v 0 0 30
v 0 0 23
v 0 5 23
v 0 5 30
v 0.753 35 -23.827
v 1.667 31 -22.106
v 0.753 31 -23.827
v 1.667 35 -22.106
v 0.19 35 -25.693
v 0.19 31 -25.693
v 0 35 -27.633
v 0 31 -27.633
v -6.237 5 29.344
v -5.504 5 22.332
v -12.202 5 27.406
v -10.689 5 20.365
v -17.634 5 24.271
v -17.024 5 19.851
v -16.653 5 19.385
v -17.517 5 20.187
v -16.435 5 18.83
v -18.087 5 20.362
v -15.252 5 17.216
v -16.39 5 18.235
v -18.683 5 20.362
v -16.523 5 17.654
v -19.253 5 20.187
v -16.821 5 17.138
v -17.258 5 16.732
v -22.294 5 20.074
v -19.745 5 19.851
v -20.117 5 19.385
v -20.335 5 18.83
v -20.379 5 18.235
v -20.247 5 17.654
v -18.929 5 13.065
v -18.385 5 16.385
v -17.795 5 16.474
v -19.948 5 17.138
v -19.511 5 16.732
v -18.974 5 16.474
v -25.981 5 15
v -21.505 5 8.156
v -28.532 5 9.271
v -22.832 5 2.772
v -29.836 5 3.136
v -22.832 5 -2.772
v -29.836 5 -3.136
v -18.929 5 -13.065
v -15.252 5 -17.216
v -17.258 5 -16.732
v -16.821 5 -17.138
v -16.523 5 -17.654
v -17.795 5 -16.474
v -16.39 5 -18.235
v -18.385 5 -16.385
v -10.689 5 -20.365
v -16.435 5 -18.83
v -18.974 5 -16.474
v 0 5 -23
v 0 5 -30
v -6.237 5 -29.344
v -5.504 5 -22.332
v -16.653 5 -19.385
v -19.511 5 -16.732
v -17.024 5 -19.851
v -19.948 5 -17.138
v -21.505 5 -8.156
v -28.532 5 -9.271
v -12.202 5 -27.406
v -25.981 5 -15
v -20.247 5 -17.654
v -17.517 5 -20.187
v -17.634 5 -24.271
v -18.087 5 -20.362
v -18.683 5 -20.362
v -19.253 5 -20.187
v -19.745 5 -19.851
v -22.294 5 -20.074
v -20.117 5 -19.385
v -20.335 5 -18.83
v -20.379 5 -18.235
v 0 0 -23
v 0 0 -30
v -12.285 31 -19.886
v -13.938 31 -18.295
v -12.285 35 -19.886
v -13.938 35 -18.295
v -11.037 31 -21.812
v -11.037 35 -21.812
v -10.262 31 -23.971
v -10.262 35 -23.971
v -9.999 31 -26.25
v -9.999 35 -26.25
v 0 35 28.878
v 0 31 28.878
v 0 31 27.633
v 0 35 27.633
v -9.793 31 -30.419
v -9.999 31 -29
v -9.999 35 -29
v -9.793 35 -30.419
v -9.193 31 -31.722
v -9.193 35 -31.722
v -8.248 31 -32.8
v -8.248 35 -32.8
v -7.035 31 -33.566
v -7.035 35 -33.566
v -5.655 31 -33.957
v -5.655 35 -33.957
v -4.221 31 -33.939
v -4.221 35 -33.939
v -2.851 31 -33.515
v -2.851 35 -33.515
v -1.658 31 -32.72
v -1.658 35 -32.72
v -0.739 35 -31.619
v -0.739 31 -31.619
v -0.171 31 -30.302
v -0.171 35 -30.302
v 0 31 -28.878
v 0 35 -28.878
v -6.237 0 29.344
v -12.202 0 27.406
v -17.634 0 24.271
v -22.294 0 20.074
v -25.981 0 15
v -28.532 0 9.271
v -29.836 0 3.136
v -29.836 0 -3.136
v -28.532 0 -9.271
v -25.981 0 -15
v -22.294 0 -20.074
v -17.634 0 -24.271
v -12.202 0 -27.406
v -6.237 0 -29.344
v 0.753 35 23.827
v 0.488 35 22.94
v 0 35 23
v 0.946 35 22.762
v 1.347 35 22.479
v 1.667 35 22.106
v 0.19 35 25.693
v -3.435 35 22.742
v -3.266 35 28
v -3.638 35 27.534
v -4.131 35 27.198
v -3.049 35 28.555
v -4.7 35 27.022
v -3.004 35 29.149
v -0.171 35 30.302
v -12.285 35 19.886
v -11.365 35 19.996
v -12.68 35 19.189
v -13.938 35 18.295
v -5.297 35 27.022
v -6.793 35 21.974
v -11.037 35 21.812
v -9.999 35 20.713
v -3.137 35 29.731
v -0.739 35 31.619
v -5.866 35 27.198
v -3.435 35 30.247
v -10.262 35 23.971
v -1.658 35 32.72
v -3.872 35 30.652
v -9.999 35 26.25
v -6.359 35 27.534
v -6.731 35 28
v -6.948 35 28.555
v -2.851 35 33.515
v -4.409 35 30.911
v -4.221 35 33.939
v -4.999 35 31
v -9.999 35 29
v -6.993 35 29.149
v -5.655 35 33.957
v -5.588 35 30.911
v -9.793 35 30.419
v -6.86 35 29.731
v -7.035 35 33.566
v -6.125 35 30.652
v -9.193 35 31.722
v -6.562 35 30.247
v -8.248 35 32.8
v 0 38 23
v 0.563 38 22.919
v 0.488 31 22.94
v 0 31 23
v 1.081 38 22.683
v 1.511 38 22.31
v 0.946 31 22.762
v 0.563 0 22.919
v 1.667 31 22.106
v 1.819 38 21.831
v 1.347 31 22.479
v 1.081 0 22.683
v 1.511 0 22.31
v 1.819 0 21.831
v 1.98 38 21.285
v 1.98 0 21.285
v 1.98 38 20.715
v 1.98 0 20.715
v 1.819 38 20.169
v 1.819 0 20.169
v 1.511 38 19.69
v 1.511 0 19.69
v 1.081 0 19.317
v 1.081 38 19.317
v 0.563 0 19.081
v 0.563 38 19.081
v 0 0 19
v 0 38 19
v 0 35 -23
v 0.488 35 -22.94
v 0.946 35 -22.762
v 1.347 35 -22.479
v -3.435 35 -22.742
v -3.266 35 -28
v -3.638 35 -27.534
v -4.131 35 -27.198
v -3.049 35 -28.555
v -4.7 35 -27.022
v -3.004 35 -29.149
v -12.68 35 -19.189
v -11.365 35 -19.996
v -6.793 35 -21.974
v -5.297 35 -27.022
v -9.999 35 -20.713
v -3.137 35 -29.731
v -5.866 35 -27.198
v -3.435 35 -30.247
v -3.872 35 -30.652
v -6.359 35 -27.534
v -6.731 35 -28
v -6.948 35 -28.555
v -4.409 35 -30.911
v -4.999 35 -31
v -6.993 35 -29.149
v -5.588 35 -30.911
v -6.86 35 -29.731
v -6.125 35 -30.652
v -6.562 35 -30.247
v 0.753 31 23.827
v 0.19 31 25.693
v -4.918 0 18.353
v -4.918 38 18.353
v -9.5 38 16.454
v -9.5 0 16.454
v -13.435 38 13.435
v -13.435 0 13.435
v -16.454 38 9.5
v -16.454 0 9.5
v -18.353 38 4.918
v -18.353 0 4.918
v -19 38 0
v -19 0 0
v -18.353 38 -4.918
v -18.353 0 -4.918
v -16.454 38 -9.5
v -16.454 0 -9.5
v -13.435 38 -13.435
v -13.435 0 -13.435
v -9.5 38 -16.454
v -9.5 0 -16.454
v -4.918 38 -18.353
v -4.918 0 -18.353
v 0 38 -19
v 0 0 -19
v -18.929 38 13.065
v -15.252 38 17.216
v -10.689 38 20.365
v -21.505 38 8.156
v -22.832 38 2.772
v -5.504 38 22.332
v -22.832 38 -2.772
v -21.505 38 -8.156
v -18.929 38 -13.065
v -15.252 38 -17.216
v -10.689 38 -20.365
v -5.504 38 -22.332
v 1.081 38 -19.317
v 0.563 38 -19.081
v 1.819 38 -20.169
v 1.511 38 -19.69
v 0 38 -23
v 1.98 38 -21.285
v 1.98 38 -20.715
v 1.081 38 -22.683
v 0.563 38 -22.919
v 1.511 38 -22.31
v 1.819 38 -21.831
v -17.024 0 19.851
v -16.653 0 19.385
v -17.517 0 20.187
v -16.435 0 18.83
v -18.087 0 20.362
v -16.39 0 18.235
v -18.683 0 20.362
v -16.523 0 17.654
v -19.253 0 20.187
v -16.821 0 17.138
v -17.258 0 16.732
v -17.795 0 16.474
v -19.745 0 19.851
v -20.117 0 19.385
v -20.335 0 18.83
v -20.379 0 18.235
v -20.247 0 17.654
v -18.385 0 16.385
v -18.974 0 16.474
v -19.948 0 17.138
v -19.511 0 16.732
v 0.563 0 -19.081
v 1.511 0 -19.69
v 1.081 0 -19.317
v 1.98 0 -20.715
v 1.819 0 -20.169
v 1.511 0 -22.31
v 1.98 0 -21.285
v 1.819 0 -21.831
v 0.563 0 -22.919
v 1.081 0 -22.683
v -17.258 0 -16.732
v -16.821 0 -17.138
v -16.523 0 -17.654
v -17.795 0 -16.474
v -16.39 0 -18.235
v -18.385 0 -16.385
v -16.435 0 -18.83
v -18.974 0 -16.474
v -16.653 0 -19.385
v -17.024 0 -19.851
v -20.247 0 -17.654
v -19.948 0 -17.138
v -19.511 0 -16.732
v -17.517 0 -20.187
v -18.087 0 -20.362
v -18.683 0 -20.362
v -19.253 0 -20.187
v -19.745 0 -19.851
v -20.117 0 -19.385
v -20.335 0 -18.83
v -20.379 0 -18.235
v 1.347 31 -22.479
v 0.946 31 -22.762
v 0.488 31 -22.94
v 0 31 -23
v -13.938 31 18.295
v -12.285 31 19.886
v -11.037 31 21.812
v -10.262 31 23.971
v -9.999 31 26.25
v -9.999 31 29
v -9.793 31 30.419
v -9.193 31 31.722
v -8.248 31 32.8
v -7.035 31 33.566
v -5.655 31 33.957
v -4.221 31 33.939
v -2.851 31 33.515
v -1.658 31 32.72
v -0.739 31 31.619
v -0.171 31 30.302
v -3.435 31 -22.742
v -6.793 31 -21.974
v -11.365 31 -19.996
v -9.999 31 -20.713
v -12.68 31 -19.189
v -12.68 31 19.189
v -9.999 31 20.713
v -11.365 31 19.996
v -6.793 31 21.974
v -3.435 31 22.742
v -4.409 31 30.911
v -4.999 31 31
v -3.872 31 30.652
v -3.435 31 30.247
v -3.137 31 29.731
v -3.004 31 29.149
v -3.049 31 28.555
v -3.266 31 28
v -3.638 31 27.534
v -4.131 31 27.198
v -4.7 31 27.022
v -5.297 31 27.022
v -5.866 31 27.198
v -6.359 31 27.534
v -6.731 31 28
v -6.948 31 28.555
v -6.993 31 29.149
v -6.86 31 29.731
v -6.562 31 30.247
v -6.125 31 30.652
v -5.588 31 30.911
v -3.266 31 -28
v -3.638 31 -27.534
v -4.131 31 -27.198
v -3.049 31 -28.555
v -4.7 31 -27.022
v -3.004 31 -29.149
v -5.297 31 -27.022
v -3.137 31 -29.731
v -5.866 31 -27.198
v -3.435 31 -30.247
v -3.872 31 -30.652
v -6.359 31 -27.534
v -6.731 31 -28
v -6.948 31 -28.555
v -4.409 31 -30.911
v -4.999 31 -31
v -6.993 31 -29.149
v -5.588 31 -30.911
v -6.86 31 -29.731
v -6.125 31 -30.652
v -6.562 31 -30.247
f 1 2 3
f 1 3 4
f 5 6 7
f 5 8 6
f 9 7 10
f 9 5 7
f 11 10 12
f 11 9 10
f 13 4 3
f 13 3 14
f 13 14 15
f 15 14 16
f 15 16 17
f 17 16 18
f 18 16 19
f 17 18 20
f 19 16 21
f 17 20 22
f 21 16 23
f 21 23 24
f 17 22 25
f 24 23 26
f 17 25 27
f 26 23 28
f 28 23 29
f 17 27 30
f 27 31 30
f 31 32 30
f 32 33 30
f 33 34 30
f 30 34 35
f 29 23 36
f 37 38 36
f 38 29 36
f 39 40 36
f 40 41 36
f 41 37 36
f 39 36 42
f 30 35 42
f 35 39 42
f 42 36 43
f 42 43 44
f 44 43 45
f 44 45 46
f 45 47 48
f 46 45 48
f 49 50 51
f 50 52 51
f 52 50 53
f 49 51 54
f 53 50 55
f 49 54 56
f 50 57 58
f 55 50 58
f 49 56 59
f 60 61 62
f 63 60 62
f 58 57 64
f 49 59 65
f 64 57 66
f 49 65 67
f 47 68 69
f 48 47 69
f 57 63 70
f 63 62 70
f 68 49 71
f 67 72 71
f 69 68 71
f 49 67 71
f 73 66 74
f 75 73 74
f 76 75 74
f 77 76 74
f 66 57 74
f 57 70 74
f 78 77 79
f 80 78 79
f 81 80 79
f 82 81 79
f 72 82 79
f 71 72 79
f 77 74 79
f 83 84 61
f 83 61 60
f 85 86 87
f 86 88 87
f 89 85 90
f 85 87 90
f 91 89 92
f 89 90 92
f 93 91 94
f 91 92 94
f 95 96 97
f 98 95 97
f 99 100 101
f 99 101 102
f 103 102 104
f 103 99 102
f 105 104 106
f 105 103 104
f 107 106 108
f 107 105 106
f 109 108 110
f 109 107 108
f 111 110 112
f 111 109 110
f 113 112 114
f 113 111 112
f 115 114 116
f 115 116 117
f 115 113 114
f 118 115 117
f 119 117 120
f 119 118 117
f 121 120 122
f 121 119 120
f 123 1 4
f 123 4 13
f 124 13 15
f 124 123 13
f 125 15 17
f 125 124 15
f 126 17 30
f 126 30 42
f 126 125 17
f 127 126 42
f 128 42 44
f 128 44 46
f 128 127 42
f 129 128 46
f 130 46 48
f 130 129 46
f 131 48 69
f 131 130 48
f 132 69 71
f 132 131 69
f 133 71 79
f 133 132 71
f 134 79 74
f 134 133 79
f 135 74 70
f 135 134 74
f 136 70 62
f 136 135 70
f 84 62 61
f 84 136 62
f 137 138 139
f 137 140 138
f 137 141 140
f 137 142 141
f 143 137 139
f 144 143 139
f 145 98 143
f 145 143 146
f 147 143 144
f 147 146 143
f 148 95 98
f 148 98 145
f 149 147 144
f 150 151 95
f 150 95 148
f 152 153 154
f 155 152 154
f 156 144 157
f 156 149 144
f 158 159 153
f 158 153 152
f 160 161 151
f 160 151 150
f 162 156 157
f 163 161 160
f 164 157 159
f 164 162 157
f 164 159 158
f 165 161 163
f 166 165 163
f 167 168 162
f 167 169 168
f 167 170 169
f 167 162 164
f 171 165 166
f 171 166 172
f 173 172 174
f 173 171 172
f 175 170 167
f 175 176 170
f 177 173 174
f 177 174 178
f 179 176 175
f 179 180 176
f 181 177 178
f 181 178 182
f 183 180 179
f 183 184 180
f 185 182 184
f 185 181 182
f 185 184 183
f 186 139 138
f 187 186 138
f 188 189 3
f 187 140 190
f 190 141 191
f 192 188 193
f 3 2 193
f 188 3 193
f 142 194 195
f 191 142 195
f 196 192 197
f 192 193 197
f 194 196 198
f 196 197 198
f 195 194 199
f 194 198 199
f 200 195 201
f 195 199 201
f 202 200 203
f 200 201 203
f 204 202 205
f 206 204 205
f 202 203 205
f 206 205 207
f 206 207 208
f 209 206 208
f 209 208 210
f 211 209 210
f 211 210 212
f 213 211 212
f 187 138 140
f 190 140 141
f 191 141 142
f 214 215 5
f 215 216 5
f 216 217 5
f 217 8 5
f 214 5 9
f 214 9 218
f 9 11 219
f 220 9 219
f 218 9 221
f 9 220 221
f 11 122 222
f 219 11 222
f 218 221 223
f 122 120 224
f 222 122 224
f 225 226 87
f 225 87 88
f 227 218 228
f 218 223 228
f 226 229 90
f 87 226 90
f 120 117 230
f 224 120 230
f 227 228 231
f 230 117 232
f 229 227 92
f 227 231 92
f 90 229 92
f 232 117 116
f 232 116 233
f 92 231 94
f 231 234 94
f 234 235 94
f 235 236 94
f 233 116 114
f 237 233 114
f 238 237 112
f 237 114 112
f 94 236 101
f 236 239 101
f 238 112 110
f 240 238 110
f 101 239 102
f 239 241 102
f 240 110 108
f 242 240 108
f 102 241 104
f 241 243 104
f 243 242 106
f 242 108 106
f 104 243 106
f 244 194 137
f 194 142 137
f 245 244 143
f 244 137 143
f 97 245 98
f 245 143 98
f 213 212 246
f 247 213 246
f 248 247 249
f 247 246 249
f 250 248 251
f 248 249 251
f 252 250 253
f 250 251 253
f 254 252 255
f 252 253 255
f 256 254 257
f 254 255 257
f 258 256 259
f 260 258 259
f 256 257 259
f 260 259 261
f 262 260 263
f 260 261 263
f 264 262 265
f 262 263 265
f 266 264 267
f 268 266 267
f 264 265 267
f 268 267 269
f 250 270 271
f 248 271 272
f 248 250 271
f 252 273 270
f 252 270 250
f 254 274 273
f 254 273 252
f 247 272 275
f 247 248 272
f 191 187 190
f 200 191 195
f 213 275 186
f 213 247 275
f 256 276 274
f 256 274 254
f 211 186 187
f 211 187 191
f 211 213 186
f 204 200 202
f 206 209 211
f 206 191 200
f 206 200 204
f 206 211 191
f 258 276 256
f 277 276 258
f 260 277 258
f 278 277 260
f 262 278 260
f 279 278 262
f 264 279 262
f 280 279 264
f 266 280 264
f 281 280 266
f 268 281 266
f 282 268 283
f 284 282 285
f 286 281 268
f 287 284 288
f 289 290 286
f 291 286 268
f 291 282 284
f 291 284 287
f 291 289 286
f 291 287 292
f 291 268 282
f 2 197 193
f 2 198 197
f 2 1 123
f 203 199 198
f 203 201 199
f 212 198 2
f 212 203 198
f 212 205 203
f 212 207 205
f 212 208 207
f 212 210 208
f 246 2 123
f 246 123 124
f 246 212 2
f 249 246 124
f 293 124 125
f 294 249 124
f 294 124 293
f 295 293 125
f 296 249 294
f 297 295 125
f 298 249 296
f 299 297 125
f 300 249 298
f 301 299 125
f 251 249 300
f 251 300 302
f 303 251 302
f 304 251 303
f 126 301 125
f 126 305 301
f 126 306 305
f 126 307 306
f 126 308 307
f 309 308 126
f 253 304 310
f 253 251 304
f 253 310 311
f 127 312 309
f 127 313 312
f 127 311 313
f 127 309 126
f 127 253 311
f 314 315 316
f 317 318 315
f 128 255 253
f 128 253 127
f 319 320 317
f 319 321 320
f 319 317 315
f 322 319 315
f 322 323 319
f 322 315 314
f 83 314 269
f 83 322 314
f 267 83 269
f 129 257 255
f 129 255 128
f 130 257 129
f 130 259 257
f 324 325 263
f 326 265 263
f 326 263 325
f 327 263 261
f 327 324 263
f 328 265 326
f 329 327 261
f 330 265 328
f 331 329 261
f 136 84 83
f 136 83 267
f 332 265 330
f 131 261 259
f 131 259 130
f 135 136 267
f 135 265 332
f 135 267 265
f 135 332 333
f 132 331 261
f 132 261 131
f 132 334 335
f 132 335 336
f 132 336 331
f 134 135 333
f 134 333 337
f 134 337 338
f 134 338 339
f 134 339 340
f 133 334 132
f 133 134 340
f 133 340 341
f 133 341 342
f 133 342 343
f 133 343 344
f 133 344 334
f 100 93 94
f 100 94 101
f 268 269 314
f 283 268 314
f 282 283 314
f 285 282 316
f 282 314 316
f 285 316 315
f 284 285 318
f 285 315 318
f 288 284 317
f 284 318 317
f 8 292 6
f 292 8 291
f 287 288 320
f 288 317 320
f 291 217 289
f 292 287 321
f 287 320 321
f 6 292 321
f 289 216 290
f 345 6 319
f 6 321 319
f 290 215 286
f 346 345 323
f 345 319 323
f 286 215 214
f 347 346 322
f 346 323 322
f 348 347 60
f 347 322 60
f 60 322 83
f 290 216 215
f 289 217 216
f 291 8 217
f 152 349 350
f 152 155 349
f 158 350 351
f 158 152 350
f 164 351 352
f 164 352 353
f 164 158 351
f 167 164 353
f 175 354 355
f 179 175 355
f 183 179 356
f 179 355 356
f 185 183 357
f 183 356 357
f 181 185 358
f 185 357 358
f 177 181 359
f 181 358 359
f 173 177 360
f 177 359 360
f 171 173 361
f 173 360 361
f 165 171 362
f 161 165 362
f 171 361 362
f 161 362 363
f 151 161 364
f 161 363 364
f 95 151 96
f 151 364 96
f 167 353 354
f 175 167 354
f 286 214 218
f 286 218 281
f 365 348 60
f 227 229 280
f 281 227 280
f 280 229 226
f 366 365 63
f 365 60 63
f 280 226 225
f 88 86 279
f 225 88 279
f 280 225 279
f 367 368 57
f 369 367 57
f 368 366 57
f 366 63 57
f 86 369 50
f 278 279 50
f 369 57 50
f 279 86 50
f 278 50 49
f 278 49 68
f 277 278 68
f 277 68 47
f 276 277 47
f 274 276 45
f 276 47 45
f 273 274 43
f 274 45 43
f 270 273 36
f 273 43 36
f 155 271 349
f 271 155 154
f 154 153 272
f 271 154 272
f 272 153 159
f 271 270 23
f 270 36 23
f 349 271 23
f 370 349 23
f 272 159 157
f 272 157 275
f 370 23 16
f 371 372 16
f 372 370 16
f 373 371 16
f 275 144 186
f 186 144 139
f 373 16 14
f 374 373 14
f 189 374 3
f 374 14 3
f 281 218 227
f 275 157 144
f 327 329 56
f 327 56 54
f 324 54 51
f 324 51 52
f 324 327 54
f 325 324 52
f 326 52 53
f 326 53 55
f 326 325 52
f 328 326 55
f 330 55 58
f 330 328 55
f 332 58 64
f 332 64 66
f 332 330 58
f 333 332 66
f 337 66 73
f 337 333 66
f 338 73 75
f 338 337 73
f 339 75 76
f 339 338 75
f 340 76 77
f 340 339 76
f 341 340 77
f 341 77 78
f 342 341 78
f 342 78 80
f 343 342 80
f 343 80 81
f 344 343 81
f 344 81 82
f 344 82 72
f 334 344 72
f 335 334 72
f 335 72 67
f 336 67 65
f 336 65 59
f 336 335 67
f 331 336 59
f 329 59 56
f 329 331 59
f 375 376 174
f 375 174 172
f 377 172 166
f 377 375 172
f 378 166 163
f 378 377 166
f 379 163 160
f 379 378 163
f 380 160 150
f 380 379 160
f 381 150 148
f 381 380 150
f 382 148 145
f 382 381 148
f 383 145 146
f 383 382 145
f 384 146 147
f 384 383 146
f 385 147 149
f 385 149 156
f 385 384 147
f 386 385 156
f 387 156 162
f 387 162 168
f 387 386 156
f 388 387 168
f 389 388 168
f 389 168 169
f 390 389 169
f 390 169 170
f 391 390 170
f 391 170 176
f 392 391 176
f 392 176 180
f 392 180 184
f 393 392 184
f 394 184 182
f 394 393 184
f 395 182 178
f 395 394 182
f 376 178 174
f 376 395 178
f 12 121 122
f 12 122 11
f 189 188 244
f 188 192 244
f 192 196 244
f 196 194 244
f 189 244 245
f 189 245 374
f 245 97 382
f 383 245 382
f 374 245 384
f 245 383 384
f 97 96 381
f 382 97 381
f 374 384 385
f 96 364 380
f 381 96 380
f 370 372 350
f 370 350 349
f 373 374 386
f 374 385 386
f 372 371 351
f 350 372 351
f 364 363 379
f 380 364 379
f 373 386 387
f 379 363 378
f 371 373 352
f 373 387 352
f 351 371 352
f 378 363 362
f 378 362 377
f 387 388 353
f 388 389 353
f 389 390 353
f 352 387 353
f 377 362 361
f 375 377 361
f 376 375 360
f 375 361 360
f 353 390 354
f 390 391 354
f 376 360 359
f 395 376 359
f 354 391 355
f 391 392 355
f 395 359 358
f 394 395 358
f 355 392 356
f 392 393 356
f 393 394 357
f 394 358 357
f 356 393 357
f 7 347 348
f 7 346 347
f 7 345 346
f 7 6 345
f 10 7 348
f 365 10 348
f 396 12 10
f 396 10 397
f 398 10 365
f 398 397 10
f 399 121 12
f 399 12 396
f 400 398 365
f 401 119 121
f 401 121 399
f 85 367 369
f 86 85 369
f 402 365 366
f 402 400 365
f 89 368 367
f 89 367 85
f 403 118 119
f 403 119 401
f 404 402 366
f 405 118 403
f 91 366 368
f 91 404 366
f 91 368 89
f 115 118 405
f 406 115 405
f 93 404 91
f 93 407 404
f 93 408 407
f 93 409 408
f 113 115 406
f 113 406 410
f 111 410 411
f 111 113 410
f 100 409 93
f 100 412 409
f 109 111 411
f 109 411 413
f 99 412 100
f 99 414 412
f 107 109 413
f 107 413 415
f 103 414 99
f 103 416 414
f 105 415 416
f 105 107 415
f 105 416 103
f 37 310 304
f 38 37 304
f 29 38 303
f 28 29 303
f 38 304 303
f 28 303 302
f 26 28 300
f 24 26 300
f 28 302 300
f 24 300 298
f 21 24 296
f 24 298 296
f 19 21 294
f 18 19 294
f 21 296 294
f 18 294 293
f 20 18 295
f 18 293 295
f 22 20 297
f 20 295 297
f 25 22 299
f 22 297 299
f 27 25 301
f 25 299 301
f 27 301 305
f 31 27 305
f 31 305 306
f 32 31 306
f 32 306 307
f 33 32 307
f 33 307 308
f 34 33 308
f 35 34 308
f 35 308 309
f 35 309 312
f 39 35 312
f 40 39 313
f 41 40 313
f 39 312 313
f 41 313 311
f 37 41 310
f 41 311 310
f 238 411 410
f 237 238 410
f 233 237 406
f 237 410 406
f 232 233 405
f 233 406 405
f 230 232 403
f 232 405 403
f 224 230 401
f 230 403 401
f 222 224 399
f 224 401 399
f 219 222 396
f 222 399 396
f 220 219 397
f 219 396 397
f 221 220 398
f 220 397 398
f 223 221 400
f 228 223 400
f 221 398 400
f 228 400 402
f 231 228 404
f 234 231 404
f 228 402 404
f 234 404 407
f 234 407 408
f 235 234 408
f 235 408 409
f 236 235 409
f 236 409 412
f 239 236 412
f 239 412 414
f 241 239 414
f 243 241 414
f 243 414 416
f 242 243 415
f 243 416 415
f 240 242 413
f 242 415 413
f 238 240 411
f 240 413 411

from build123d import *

# Parameters (mm, degrees)
BOSS_EXTRUDE1_DEPTH = 38
BOSS_EXTRUDE2_DEPTH = 5
SKETCH3_R           = 2
CUT_EXTRUDE1_DEPTH  = 5
BOSS_EXTRUDE3_START = -4
BOSS_EXTRUDE3_DEPTH = 4
SKETCH5_R           = 2
CUT_EXTRUDE2_DEPTH  = 4
FILLET1_R           = 10


with BuildPart() as part:
    # Sketch1 → Boss-Extrude1 (new body)
    with BuildSketch(Plane(origin=(0, 0, 0), x_dir=(1, 0, 0), z_dir=(0, 1, 0))):
        with BuildLine():
            ThreePointArc((0, 23), (-23, 0), (0, -23))
            ThreePointArc((0, -23), (2, -21), (0, -19))
            ThreePointArc((0, -19), (-19, 0), (0, 19))
            ThreePointArc((0, 19), (2, 21), (0, 23))
        make_face()
    extrude(amount=BOSS_EXTRUDE1_DEPTH)

    # Sketch2 → Boss-Extrude2 (add)
    with BuildSketch(Plane(origin=(0, 0, 0), x_dir=(1, 0, 0), z_dir=(0, 1, 0))):
        with BuildLine():
            Line((0, 30), (0, 23))
            ThreePointArc((0, 23), (-23, 0), (0, -23))
            Line((0, -23), (0, -30))
            ThreePointArc((0, -30), (-30, 0), (0, 30))
        make_face()
    extrude(amount=BOSS_EXTRUDE2_DEPTH)

    # Sketch3 → Cut-Extrude1 (cut)
    with BuildSketch(Plane(origin=(0, 0, 0), x_dir=(-1, 0, 0), z_dir=(0, -1, 0))):
        with Locations(Location((18.384776311, -18.384776311, 0), (0, 0, 90))):
            Circle(SKETCH3_R)
    cut_extrude1 = extrude(amount=-CUT_EXTRUDE1_DEPTH, mode=Mode.SUBTRACT)

    # Mirror1: Cut-Extrude1 across plane
    add(cut_extrude1.mirror(Plane.XY), mode=Mode.SUBTRACT)

    # Sketch4 → Boss-Extrude3 (add)
    with BuildSketch(Plane(origin=(0, 35, 0), x_dir=(1, 0, 0), z_dir=(0, 1, 0)).offset(BOSS_EXTRUDE3_START)):
        with BuildLine():
            Line((0, 28.877875957), (0, 23))
            ThreePointArc((0, 23), (-5.128361746, 22.420970224), (-9.998508349, 20.713035287))
            Line((-9.998508349, 20.713035287), (-9.998508349, 29))
            ThreePointArc((-9.998508349, 29), (-4.937441773, 33.999627073), (0, 28.877875957))
        make_face()
    boss_extrude3 = extrude(amount=BOSS_EXTRUDE3_DEPTH)

    # Sketch5 → Cut-Extrude2 (cut)
    with BuildSketch(Plane.XZ.offset(-31)):
        with Locations(Location((-4.998508349, -29, 0), (0, 0, 270))):
            Circle(SKETCH5_R)
    cut_extrude2 = extrude(amount=-CUT_EXTRUDE2_DEPTH, mode=Mode.SUBTRACT)

    # Mirror2: Boss-Extrude3, Cut-Extrude2 across plane
    add(boss_extrude3.mirror(Plane.XY))
    add(cut_extrude2.mirror(Plane.XY), mode=Mode.SUBTRACT)

    # Fillet1
    fillet1_edges = [part.edges().sort_by_distance(p)[0] for p in [
        (0, 33, -23),
        (-9.998508349, 33, -20.713035287),
        (-9.998508349, 33, 20.713035287),
        (0, 33, 23),
    ]]
    fillet(fillet1_edges, radius=FILLET1_R)


solid = part.part
